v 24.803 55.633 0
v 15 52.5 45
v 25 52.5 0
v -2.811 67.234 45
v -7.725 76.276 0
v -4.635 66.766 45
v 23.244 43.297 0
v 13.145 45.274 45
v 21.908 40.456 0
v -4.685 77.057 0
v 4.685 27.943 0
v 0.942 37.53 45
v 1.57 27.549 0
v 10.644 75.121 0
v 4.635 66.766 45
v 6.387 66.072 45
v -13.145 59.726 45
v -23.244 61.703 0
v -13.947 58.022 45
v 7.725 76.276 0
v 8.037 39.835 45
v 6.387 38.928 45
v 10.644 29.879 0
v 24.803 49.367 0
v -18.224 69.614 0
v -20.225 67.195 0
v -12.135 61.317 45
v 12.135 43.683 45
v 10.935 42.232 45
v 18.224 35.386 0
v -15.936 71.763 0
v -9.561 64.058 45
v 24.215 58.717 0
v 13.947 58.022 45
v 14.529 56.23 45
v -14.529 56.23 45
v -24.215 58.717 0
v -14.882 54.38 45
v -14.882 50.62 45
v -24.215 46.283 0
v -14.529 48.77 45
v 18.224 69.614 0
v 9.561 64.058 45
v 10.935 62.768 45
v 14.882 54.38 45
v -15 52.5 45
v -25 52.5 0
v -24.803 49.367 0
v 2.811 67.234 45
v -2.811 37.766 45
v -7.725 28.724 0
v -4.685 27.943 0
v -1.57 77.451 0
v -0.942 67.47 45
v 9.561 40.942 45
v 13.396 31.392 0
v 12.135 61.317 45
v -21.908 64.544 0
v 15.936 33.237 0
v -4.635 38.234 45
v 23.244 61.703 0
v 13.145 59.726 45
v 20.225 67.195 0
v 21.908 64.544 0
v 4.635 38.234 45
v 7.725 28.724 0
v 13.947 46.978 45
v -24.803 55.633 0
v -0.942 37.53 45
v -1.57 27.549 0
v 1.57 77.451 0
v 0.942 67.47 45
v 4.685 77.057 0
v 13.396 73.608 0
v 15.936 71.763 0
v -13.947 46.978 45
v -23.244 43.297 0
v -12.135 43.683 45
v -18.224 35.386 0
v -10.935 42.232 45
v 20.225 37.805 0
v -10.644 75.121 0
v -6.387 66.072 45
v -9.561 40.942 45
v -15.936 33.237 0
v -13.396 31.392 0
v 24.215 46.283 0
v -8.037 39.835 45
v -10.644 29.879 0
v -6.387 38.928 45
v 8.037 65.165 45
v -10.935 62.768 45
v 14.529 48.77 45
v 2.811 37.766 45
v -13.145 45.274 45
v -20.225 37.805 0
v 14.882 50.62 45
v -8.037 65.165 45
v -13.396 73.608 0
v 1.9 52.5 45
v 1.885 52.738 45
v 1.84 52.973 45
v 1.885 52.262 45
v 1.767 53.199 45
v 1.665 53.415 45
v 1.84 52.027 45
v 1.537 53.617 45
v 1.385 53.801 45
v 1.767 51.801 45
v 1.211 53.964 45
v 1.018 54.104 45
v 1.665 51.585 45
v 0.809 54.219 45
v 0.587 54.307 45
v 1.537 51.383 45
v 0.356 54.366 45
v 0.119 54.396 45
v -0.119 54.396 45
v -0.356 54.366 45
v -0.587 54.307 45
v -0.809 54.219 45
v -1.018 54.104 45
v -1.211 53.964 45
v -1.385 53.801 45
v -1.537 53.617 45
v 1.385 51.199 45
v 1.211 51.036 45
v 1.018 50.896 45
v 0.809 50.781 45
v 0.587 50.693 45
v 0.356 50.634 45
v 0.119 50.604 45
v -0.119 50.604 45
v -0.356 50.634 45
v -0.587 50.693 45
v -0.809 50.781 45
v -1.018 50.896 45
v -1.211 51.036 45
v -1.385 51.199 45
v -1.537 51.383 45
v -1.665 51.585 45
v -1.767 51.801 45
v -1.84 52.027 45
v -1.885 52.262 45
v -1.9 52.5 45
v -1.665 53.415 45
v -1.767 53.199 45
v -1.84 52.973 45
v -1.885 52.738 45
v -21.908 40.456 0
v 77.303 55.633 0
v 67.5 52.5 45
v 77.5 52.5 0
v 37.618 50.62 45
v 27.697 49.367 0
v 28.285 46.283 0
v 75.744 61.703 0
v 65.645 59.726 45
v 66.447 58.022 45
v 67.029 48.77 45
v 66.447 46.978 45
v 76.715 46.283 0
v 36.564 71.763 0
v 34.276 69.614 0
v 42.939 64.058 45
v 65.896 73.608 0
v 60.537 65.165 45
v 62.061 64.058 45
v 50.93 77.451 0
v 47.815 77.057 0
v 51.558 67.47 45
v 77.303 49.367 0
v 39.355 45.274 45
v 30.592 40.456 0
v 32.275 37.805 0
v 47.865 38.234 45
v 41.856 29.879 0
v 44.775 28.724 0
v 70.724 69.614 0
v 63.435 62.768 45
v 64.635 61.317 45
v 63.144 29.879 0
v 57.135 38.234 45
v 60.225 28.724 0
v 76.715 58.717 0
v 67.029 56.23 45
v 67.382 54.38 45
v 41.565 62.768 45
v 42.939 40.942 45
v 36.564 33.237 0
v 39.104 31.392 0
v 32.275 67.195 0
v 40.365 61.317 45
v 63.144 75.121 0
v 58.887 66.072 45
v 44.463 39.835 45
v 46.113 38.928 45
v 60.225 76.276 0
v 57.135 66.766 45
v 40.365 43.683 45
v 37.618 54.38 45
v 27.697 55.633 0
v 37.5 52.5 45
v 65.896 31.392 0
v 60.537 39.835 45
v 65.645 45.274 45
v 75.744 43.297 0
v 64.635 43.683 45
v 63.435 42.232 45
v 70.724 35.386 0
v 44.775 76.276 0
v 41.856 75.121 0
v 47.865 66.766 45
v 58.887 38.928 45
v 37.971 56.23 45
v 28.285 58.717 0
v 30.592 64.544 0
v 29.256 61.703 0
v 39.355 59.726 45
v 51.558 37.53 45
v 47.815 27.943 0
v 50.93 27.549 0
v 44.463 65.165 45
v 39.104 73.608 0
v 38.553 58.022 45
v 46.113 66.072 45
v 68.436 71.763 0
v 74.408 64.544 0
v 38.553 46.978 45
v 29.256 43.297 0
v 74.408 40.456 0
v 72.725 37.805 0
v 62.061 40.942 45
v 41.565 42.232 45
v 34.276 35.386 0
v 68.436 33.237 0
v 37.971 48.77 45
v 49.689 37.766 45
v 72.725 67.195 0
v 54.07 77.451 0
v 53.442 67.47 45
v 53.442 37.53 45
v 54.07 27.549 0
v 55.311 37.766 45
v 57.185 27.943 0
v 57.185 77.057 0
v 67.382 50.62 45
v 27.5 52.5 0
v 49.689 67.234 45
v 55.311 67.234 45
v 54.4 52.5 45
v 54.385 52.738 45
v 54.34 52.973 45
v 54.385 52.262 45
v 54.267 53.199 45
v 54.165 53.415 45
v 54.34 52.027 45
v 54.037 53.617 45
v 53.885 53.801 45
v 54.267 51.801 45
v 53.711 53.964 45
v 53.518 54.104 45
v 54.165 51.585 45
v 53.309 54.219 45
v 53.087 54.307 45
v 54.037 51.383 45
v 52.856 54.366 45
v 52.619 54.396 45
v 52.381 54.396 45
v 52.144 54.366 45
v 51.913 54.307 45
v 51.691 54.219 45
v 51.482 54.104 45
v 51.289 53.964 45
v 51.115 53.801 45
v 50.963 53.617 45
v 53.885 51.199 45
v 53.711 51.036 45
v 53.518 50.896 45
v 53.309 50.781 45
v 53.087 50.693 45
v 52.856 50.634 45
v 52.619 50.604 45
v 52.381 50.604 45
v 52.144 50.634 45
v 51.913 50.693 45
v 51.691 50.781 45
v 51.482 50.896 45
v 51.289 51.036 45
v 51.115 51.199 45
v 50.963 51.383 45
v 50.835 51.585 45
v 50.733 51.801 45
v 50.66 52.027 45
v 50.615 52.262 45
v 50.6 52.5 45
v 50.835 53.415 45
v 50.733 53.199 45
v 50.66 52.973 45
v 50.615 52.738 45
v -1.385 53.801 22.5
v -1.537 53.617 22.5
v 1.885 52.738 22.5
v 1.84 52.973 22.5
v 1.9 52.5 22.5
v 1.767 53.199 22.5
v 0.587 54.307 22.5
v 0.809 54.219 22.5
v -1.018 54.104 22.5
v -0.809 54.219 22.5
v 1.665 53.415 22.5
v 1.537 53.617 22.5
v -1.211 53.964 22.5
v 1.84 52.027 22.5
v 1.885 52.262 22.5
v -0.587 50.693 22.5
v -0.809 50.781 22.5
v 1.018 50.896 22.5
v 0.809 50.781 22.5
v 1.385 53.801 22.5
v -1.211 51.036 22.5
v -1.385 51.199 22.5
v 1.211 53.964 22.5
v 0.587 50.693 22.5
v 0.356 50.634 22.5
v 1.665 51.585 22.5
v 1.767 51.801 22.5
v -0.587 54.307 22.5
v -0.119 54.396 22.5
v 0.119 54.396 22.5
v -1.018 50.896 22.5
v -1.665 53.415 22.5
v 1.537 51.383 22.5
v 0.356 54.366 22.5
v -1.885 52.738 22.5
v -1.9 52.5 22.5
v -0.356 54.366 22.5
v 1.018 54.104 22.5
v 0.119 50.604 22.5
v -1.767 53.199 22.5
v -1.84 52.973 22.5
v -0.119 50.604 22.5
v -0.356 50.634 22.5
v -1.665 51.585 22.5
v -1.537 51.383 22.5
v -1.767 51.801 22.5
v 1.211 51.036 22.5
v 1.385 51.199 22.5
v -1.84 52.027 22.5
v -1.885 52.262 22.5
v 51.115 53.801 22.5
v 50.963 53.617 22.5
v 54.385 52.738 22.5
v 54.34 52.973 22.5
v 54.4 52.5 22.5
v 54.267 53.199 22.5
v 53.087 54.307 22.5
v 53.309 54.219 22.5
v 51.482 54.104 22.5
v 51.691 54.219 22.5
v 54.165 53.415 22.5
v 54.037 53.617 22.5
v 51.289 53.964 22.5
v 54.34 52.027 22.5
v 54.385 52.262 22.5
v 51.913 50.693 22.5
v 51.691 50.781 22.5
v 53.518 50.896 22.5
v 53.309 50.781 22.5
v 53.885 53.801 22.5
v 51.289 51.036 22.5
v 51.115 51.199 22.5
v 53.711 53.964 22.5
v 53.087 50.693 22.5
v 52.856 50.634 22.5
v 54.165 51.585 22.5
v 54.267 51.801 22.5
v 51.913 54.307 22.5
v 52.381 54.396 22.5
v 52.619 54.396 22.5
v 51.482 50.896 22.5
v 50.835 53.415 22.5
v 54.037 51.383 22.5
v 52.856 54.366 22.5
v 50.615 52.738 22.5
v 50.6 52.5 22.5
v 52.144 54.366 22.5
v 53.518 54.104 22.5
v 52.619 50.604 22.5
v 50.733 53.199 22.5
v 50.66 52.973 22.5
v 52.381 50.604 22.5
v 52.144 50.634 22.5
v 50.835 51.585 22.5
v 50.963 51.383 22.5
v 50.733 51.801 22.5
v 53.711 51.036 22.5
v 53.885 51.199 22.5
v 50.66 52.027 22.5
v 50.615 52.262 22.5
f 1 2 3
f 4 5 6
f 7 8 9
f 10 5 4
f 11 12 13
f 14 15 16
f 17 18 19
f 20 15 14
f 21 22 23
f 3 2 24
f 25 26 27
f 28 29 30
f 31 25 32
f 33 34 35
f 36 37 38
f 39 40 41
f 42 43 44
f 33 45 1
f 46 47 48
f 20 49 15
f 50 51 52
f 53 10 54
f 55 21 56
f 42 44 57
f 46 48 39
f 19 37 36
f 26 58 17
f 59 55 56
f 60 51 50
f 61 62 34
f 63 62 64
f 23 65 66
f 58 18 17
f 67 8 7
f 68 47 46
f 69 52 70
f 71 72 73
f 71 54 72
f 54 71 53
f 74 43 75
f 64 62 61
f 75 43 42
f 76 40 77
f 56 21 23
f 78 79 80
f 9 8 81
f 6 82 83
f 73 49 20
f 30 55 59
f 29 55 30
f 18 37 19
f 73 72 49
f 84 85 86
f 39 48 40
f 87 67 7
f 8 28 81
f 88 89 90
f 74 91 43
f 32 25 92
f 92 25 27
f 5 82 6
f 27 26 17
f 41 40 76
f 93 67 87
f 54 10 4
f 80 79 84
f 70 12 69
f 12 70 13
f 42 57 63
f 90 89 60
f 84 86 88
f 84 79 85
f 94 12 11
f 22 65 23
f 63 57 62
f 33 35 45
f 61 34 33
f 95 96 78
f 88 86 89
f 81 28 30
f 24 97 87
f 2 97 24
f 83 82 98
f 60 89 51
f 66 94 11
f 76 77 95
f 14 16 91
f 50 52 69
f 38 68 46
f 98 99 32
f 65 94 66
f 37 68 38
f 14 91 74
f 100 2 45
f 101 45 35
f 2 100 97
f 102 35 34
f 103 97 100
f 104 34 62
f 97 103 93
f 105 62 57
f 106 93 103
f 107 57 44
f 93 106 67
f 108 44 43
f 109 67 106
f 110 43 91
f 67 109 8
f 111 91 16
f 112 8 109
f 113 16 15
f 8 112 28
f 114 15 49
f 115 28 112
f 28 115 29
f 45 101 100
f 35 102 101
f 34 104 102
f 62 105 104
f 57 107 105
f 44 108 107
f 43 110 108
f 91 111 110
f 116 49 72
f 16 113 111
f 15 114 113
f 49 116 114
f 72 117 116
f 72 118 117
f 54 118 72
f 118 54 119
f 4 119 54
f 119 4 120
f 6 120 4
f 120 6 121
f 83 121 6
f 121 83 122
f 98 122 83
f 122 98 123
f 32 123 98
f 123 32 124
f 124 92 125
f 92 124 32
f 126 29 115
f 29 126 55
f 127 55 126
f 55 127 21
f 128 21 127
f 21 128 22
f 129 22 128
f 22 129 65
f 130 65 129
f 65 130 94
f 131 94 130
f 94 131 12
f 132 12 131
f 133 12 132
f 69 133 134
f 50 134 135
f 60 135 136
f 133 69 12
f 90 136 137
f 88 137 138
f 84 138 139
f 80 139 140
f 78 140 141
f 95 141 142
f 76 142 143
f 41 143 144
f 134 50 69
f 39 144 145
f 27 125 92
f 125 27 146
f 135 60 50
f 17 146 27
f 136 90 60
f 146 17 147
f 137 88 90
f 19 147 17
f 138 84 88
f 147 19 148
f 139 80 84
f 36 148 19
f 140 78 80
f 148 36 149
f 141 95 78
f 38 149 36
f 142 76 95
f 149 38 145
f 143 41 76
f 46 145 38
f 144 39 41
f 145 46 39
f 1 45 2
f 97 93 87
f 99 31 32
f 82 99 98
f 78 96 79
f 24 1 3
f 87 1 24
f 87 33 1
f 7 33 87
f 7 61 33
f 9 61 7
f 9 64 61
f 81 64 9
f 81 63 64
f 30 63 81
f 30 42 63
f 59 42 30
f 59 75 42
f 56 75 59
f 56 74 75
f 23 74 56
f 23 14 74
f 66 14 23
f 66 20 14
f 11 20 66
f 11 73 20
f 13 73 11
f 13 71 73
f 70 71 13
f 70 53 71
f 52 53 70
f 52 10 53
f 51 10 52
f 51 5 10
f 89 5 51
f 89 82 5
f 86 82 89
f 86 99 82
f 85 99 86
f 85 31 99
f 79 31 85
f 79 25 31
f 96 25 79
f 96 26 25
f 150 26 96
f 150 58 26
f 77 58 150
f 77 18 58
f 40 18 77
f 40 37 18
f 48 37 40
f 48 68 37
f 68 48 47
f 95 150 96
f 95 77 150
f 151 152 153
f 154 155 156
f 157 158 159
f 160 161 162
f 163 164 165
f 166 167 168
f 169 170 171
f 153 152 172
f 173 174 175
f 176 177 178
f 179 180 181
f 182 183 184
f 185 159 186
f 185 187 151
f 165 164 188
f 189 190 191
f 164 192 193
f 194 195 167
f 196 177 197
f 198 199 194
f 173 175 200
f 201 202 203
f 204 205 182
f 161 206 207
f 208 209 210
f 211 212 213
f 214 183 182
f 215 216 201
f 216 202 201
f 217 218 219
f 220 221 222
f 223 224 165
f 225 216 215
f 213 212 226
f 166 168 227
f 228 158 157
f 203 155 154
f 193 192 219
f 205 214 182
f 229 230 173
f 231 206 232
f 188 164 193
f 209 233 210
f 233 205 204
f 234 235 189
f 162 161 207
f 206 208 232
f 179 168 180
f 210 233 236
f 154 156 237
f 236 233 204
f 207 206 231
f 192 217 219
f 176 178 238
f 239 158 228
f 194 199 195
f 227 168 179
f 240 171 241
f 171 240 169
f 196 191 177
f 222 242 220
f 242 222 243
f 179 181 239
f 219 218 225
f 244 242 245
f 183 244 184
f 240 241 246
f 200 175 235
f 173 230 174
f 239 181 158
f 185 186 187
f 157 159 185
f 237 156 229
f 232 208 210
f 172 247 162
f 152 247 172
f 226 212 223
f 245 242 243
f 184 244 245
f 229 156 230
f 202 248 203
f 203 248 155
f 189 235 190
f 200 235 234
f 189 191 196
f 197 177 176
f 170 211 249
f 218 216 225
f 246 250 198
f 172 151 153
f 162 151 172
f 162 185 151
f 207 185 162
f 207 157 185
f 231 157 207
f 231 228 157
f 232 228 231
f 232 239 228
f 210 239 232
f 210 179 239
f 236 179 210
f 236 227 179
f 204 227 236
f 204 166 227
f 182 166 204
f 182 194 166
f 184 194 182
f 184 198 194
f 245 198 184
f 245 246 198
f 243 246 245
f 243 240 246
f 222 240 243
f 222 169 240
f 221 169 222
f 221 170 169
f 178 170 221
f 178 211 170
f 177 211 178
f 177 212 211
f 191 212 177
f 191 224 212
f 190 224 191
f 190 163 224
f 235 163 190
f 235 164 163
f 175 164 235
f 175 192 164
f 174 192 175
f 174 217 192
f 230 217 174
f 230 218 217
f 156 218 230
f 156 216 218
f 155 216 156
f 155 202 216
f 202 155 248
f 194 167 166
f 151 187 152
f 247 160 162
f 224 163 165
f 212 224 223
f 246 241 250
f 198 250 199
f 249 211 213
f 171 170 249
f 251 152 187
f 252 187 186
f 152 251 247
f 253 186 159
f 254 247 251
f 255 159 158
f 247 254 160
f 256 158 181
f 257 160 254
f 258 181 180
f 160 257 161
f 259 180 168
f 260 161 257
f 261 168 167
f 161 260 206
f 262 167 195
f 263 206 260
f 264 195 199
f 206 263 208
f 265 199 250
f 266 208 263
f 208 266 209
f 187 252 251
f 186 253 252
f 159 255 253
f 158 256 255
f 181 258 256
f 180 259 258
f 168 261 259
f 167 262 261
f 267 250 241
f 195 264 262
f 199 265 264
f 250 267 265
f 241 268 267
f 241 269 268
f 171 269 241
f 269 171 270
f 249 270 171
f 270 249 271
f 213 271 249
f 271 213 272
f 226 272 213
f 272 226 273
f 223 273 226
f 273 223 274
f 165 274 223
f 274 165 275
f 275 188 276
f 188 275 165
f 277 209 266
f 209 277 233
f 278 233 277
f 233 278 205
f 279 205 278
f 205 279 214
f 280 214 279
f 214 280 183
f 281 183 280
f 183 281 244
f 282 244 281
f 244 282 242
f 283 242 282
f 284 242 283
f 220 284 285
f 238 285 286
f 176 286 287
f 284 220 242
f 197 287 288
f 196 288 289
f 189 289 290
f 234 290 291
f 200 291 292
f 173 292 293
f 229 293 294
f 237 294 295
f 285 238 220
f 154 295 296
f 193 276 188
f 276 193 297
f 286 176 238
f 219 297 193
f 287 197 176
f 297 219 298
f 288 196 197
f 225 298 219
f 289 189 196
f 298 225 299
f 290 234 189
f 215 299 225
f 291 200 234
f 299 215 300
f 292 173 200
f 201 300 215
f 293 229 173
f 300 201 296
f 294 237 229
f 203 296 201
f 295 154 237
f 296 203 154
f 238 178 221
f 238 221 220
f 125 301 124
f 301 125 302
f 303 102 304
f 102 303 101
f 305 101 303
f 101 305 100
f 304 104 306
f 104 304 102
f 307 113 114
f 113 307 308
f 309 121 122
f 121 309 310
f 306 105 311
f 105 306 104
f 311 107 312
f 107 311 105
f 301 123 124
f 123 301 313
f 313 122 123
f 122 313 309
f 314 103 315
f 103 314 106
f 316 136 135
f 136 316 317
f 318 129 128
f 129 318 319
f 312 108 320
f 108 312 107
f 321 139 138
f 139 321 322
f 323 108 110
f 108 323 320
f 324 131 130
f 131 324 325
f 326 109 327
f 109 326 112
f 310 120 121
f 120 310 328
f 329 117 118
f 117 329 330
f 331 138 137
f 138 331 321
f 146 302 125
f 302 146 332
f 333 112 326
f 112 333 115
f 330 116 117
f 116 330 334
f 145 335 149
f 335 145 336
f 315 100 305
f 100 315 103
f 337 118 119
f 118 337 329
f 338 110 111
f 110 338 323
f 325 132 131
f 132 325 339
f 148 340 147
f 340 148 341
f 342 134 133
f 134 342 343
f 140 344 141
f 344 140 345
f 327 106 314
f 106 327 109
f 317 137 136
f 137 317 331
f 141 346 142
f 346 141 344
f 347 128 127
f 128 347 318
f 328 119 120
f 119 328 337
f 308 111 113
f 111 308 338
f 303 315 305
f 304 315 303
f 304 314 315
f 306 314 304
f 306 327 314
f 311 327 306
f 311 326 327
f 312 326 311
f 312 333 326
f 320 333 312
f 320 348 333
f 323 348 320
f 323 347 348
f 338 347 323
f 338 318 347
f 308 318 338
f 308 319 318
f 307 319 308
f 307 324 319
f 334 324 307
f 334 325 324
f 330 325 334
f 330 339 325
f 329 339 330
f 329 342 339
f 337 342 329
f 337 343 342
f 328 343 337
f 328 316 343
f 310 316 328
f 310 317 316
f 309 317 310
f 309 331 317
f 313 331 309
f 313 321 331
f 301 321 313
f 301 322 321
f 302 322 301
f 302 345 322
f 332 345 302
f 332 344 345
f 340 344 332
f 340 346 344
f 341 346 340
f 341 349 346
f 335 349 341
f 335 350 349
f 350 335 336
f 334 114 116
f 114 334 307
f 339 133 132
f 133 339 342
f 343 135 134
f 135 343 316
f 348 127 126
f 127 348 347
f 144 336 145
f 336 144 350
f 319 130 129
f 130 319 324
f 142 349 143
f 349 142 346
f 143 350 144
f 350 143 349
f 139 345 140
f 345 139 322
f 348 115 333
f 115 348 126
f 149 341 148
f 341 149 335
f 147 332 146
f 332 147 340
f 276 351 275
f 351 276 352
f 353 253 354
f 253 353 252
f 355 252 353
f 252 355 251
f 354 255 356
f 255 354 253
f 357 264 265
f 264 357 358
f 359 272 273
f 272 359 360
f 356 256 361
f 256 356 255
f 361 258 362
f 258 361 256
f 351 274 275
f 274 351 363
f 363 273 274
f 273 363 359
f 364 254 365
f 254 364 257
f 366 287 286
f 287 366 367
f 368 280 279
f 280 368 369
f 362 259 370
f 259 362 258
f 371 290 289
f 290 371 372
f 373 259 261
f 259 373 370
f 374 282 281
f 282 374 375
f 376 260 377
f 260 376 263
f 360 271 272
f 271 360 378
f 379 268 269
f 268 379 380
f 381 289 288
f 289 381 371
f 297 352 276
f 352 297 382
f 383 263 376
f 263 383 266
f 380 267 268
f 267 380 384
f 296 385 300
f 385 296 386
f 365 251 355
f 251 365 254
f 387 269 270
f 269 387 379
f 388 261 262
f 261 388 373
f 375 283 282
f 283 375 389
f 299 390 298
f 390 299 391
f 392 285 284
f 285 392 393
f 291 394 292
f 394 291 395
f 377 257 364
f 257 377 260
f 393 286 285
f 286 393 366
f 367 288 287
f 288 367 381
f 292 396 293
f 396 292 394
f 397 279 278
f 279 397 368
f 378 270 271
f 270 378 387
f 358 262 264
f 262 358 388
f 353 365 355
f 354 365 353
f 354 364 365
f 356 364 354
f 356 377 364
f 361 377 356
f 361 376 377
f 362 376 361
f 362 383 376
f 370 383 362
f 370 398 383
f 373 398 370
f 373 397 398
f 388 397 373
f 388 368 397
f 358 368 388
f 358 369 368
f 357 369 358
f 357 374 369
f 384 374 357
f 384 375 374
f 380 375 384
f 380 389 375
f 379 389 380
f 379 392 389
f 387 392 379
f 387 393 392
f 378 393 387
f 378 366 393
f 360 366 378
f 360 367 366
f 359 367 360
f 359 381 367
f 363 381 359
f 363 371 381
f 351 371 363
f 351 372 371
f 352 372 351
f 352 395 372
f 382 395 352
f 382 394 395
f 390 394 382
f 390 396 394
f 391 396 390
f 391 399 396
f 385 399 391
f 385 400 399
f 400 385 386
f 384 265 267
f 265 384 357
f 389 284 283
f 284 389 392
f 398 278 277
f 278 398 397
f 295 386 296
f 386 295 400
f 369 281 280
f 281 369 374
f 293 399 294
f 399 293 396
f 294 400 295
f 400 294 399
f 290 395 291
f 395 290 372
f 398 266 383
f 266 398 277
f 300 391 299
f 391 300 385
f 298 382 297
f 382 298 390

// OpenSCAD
// parametric spool holder
// author Free Beachler for Terawatt Industries

w = 60;
l = 60;
elev = 45;
bott_r = 25;
top_r = 15;
m4_diameter = 4 - 0.2;	//self-tapping for M4

spool_holder_feet(w, l, elev, bott_r, top_r, m4_diameter);

module spool_holder_feet(w, l, e, rb, rt, m4d) {
	difference() {
		spool_hoder_feet_base(w, l, e, rb, rt, m4d);
		translate([0, 0, e / 2]) spool_holder_feet_screw_holes_positive(w, l, e, m4d);
	}
}

module spool_hoder_feet_base(w, l, e, rb, rt, m4d) {
	for (x = [0, w - 15 * 0.5]) {
		for (y = [l - 15 * 0.5]) {
			translate([x, y, 0]) cylinder(r1 = rb, r2 = rt, h = e, $fn=50);
		}
	}
//	translate([w - 15 * 0.5, 0, 0]) cylinder(r = rb, r2 = rt, h = e, $fn=50);
}

module spool_holder_feet_screw_holes_positive(w, l, e, m4d) {
	for (x = [0, w - 15 * 0.5]) {
		for (y = [l - 15 * 0.5]) {
			translate([x, y, 0]) cylinder(r = m4d / 2, h = e, $fn=50);
		}
	}
//	translate([w - 15 * 0.5, 0, 0]) cylinder(r = m4d / 2, h = e, $fn=50);
}
